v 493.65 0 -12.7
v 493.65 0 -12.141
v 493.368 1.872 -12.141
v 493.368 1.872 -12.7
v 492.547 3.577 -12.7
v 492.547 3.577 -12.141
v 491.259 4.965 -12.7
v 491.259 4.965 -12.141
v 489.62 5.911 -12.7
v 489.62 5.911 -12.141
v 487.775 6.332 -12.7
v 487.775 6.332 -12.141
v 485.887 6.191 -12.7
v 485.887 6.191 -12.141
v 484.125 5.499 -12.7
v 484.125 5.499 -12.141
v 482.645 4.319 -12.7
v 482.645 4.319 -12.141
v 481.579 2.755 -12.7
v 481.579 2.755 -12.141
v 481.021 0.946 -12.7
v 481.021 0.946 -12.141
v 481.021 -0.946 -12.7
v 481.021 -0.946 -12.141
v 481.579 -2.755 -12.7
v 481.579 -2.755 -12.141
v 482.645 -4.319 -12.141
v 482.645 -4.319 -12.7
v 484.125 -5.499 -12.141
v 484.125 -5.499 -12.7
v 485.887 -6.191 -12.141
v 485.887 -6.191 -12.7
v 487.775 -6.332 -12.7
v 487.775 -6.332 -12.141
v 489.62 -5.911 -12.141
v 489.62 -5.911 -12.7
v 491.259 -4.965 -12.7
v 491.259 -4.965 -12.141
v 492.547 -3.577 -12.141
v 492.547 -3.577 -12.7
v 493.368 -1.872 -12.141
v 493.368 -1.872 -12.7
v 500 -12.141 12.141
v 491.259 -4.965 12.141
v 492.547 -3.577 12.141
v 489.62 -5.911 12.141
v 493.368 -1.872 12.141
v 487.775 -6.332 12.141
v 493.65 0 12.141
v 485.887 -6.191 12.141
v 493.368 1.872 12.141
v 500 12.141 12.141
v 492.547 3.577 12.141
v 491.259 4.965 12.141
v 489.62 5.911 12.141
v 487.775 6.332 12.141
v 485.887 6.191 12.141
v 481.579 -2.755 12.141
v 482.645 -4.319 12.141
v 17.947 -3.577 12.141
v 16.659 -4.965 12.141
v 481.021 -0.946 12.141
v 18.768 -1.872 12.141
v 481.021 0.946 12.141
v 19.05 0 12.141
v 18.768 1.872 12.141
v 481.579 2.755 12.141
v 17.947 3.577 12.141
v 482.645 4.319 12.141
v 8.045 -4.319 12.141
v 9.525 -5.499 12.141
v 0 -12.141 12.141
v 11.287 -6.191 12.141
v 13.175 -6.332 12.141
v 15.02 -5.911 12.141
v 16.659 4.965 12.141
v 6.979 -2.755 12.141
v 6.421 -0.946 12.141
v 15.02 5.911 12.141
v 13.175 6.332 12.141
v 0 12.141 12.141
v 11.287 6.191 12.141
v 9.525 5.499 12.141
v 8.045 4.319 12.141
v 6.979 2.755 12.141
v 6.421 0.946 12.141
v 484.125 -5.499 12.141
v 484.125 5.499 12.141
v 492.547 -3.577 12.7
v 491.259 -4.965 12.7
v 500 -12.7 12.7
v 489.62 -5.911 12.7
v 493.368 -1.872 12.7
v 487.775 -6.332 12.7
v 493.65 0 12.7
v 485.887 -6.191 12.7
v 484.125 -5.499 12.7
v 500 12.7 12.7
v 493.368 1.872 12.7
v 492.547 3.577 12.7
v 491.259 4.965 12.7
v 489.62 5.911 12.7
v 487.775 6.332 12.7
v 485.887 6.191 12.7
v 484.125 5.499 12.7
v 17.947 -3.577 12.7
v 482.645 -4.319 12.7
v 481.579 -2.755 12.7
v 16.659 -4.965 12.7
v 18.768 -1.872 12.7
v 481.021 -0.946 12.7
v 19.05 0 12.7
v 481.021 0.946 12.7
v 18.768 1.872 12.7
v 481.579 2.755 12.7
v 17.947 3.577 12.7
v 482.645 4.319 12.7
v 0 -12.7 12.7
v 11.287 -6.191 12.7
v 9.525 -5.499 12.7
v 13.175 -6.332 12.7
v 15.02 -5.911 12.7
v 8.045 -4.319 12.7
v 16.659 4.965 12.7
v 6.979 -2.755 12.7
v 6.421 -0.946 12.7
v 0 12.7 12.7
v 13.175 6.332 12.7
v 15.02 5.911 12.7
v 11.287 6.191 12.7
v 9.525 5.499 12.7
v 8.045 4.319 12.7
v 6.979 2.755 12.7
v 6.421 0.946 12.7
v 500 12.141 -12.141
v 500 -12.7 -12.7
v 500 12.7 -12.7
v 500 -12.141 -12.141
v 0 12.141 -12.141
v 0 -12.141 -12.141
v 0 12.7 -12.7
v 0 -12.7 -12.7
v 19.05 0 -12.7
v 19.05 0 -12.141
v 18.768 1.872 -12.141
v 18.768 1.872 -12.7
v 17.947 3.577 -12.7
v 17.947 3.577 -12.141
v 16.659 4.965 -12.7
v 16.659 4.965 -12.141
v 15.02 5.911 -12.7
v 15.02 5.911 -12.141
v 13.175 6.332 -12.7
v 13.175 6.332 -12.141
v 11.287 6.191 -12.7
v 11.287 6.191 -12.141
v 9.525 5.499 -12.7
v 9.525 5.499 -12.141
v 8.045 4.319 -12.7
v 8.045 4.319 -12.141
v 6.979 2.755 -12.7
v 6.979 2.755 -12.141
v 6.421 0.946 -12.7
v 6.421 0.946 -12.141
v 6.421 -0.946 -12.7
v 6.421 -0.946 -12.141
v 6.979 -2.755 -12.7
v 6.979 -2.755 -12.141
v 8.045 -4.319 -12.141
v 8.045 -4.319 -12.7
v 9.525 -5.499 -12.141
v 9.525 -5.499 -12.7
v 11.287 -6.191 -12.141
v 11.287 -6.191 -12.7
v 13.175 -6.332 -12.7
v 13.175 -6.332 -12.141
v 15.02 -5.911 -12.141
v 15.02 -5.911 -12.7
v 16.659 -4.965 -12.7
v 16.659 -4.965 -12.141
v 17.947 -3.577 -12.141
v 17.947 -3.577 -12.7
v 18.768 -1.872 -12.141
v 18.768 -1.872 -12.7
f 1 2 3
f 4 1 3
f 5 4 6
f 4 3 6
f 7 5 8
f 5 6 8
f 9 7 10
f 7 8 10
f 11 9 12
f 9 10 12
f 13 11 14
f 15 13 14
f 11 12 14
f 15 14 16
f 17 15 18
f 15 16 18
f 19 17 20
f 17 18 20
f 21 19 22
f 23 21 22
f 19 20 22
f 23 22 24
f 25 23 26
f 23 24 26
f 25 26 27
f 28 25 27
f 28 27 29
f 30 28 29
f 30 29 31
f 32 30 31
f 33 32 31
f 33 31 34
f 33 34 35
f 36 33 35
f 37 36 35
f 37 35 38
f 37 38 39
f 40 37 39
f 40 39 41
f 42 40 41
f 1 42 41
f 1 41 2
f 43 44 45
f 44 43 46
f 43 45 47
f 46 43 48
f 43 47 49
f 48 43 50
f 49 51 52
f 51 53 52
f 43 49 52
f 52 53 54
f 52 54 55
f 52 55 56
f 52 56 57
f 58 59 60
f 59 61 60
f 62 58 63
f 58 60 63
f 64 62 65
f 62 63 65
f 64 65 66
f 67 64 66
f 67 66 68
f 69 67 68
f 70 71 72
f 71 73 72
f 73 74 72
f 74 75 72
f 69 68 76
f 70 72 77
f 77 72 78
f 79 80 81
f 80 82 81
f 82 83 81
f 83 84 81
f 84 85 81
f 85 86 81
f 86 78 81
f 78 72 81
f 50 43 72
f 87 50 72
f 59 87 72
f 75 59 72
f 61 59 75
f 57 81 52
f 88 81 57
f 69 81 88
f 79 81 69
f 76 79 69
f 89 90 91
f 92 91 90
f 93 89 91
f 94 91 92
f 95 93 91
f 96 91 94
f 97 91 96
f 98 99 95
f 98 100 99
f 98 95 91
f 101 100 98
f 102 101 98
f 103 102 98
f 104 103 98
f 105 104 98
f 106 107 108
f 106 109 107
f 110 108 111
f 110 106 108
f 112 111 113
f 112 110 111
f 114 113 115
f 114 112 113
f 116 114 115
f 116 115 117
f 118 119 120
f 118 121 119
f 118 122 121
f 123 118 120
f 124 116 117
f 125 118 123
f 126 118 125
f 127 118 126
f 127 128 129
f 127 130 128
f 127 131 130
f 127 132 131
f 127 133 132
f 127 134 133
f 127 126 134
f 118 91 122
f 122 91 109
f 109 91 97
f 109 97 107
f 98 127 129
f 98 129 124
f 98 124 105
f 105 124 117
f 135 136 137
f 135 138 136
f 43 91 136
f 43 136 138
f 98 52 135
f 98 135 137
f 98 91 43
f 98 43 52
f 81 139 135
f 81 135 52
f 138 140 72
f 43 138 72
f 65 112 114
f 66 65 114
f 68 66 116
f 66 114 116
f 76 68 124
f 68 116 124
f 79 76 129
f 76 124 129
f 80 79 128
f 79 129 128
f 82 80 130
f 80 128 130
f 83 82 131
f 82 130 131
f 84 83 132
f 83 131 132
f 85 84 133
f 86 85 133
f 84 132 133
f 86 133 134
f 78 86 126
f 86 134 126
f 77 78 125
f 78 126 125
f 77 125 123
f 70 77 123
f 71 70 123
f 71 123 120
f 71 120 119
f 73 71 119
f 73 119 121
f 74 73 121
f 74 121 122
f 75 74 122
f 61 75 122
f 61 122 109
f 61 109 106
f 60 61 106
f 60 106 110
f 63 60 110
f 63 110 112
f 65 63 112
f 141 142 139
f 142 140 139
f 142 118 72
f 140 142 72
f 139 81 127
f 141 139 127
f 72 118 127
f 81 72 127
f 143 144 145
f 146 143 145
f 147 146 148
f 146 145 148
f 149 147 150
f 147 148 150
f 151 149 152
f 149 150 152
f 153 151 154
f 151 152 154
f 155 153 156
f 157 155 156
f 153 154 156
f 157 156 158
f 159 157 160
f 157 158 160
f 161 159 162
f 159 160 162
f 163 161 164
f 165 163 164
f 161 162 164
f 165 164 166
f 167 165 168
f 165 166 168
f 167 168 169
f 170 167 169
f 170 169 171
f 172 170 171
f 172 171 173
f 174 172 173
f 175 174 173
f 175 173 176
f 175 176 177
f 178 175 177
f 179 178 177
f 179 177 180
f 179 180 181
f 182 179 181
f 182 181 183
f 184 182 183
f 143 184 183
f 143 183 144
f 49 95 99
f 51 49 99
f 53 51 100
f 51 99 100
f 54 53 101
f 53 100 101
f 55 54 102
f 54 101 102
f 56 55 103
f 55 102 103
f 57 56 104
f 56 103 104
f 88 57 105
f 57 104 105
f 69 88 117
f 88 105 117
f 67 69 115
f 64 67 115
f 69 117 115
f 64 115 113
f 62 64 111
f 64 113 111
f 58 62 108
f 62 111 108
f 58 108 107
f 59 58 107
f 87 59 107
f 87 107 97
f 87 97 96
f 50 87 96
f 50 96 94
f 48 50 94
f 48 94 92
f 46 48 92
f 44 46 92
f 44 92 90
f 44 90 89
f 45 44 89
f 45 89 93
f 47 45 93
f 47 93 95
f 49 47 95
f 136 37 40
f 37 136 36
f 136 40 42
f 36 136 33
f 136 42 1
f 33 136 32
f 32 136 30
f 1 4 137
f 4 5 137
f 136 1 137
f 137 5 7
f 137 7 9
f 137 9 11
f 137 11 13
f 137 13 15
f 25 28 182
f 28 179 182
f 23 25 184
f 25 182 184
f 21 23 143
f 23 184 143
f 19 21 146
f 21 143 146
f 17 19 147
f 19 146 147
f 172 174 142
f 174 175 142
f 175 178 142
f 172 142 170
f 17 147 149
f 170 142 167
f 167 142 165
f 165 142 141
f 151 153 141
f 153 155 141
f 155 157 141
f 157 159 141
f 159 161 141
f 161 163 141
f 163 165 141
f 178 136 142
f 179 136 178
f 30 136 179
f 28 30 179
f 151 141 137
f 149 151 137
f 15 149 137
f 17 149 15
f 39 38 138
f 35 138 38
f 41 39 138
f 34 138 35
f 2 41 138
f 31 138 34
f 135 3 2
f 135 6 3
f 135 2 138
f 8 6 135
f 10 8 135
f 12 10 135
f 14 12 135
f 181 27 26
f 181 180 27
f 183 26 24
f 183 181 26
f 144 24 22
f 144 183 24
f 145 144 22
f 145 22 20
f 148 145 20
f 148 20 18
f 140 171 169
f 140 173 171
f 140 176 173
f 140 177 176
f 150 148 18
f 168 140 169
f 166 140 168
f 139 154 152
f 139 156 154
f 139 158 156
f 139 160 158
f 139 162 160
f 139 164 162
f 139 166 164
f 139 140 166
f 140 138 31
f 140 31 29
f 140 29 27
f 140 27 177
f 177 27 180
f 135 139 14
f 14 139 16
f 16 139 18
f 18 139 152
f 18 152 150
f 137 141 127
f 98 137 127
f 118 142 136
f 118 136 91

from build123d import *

# Parameters (mm, degrees)
SKETCH1_W                              = 25.4
SKETCH1_H                              = 25.4
SKETCH1_W_2                            = 24.2824
SKETCH1_H_2                            = 24.2824
AL_TUBE_SQUARE_1_SQ_X_022_WALL_3_DEPTH = 500
CROQUIS3_R                             = 6.35
CORTAR_EXTRUIR1_DEPTH                  = 501.805800685


with BuildPart() as part:
    # Sketch1 → Al tube (square) 1 SQ X .022 WALL(3) (new body)
    with BuildSketch(Plane.YZ):
        Rectangle(SKETCH1_W, SKETCH1_H)
        Rectangle(SKETCH1_W_2, SKETCH1_H_2, mode=Mode.SUBTRACT)
    extrude(amount=AL_TUBE_SQUARE_1_SQ_X_022_WALL_3_DEPTH)

    # Croquis3 → Cortar-Extruir1 (cut, through all)
    with BuildSketch(Plane.XY.offset(12.7)):
        with Locations((12.7, 0)):
            Circle(CROQUIS3_R)
        with Locations((487.3, 0)):
            Circle(CROQUIS3_R)
    extrude(amount=-CORTAR_EXTRUIR1_DEPTH, mode=Mode.SUBTRACT)


solid = part.part
